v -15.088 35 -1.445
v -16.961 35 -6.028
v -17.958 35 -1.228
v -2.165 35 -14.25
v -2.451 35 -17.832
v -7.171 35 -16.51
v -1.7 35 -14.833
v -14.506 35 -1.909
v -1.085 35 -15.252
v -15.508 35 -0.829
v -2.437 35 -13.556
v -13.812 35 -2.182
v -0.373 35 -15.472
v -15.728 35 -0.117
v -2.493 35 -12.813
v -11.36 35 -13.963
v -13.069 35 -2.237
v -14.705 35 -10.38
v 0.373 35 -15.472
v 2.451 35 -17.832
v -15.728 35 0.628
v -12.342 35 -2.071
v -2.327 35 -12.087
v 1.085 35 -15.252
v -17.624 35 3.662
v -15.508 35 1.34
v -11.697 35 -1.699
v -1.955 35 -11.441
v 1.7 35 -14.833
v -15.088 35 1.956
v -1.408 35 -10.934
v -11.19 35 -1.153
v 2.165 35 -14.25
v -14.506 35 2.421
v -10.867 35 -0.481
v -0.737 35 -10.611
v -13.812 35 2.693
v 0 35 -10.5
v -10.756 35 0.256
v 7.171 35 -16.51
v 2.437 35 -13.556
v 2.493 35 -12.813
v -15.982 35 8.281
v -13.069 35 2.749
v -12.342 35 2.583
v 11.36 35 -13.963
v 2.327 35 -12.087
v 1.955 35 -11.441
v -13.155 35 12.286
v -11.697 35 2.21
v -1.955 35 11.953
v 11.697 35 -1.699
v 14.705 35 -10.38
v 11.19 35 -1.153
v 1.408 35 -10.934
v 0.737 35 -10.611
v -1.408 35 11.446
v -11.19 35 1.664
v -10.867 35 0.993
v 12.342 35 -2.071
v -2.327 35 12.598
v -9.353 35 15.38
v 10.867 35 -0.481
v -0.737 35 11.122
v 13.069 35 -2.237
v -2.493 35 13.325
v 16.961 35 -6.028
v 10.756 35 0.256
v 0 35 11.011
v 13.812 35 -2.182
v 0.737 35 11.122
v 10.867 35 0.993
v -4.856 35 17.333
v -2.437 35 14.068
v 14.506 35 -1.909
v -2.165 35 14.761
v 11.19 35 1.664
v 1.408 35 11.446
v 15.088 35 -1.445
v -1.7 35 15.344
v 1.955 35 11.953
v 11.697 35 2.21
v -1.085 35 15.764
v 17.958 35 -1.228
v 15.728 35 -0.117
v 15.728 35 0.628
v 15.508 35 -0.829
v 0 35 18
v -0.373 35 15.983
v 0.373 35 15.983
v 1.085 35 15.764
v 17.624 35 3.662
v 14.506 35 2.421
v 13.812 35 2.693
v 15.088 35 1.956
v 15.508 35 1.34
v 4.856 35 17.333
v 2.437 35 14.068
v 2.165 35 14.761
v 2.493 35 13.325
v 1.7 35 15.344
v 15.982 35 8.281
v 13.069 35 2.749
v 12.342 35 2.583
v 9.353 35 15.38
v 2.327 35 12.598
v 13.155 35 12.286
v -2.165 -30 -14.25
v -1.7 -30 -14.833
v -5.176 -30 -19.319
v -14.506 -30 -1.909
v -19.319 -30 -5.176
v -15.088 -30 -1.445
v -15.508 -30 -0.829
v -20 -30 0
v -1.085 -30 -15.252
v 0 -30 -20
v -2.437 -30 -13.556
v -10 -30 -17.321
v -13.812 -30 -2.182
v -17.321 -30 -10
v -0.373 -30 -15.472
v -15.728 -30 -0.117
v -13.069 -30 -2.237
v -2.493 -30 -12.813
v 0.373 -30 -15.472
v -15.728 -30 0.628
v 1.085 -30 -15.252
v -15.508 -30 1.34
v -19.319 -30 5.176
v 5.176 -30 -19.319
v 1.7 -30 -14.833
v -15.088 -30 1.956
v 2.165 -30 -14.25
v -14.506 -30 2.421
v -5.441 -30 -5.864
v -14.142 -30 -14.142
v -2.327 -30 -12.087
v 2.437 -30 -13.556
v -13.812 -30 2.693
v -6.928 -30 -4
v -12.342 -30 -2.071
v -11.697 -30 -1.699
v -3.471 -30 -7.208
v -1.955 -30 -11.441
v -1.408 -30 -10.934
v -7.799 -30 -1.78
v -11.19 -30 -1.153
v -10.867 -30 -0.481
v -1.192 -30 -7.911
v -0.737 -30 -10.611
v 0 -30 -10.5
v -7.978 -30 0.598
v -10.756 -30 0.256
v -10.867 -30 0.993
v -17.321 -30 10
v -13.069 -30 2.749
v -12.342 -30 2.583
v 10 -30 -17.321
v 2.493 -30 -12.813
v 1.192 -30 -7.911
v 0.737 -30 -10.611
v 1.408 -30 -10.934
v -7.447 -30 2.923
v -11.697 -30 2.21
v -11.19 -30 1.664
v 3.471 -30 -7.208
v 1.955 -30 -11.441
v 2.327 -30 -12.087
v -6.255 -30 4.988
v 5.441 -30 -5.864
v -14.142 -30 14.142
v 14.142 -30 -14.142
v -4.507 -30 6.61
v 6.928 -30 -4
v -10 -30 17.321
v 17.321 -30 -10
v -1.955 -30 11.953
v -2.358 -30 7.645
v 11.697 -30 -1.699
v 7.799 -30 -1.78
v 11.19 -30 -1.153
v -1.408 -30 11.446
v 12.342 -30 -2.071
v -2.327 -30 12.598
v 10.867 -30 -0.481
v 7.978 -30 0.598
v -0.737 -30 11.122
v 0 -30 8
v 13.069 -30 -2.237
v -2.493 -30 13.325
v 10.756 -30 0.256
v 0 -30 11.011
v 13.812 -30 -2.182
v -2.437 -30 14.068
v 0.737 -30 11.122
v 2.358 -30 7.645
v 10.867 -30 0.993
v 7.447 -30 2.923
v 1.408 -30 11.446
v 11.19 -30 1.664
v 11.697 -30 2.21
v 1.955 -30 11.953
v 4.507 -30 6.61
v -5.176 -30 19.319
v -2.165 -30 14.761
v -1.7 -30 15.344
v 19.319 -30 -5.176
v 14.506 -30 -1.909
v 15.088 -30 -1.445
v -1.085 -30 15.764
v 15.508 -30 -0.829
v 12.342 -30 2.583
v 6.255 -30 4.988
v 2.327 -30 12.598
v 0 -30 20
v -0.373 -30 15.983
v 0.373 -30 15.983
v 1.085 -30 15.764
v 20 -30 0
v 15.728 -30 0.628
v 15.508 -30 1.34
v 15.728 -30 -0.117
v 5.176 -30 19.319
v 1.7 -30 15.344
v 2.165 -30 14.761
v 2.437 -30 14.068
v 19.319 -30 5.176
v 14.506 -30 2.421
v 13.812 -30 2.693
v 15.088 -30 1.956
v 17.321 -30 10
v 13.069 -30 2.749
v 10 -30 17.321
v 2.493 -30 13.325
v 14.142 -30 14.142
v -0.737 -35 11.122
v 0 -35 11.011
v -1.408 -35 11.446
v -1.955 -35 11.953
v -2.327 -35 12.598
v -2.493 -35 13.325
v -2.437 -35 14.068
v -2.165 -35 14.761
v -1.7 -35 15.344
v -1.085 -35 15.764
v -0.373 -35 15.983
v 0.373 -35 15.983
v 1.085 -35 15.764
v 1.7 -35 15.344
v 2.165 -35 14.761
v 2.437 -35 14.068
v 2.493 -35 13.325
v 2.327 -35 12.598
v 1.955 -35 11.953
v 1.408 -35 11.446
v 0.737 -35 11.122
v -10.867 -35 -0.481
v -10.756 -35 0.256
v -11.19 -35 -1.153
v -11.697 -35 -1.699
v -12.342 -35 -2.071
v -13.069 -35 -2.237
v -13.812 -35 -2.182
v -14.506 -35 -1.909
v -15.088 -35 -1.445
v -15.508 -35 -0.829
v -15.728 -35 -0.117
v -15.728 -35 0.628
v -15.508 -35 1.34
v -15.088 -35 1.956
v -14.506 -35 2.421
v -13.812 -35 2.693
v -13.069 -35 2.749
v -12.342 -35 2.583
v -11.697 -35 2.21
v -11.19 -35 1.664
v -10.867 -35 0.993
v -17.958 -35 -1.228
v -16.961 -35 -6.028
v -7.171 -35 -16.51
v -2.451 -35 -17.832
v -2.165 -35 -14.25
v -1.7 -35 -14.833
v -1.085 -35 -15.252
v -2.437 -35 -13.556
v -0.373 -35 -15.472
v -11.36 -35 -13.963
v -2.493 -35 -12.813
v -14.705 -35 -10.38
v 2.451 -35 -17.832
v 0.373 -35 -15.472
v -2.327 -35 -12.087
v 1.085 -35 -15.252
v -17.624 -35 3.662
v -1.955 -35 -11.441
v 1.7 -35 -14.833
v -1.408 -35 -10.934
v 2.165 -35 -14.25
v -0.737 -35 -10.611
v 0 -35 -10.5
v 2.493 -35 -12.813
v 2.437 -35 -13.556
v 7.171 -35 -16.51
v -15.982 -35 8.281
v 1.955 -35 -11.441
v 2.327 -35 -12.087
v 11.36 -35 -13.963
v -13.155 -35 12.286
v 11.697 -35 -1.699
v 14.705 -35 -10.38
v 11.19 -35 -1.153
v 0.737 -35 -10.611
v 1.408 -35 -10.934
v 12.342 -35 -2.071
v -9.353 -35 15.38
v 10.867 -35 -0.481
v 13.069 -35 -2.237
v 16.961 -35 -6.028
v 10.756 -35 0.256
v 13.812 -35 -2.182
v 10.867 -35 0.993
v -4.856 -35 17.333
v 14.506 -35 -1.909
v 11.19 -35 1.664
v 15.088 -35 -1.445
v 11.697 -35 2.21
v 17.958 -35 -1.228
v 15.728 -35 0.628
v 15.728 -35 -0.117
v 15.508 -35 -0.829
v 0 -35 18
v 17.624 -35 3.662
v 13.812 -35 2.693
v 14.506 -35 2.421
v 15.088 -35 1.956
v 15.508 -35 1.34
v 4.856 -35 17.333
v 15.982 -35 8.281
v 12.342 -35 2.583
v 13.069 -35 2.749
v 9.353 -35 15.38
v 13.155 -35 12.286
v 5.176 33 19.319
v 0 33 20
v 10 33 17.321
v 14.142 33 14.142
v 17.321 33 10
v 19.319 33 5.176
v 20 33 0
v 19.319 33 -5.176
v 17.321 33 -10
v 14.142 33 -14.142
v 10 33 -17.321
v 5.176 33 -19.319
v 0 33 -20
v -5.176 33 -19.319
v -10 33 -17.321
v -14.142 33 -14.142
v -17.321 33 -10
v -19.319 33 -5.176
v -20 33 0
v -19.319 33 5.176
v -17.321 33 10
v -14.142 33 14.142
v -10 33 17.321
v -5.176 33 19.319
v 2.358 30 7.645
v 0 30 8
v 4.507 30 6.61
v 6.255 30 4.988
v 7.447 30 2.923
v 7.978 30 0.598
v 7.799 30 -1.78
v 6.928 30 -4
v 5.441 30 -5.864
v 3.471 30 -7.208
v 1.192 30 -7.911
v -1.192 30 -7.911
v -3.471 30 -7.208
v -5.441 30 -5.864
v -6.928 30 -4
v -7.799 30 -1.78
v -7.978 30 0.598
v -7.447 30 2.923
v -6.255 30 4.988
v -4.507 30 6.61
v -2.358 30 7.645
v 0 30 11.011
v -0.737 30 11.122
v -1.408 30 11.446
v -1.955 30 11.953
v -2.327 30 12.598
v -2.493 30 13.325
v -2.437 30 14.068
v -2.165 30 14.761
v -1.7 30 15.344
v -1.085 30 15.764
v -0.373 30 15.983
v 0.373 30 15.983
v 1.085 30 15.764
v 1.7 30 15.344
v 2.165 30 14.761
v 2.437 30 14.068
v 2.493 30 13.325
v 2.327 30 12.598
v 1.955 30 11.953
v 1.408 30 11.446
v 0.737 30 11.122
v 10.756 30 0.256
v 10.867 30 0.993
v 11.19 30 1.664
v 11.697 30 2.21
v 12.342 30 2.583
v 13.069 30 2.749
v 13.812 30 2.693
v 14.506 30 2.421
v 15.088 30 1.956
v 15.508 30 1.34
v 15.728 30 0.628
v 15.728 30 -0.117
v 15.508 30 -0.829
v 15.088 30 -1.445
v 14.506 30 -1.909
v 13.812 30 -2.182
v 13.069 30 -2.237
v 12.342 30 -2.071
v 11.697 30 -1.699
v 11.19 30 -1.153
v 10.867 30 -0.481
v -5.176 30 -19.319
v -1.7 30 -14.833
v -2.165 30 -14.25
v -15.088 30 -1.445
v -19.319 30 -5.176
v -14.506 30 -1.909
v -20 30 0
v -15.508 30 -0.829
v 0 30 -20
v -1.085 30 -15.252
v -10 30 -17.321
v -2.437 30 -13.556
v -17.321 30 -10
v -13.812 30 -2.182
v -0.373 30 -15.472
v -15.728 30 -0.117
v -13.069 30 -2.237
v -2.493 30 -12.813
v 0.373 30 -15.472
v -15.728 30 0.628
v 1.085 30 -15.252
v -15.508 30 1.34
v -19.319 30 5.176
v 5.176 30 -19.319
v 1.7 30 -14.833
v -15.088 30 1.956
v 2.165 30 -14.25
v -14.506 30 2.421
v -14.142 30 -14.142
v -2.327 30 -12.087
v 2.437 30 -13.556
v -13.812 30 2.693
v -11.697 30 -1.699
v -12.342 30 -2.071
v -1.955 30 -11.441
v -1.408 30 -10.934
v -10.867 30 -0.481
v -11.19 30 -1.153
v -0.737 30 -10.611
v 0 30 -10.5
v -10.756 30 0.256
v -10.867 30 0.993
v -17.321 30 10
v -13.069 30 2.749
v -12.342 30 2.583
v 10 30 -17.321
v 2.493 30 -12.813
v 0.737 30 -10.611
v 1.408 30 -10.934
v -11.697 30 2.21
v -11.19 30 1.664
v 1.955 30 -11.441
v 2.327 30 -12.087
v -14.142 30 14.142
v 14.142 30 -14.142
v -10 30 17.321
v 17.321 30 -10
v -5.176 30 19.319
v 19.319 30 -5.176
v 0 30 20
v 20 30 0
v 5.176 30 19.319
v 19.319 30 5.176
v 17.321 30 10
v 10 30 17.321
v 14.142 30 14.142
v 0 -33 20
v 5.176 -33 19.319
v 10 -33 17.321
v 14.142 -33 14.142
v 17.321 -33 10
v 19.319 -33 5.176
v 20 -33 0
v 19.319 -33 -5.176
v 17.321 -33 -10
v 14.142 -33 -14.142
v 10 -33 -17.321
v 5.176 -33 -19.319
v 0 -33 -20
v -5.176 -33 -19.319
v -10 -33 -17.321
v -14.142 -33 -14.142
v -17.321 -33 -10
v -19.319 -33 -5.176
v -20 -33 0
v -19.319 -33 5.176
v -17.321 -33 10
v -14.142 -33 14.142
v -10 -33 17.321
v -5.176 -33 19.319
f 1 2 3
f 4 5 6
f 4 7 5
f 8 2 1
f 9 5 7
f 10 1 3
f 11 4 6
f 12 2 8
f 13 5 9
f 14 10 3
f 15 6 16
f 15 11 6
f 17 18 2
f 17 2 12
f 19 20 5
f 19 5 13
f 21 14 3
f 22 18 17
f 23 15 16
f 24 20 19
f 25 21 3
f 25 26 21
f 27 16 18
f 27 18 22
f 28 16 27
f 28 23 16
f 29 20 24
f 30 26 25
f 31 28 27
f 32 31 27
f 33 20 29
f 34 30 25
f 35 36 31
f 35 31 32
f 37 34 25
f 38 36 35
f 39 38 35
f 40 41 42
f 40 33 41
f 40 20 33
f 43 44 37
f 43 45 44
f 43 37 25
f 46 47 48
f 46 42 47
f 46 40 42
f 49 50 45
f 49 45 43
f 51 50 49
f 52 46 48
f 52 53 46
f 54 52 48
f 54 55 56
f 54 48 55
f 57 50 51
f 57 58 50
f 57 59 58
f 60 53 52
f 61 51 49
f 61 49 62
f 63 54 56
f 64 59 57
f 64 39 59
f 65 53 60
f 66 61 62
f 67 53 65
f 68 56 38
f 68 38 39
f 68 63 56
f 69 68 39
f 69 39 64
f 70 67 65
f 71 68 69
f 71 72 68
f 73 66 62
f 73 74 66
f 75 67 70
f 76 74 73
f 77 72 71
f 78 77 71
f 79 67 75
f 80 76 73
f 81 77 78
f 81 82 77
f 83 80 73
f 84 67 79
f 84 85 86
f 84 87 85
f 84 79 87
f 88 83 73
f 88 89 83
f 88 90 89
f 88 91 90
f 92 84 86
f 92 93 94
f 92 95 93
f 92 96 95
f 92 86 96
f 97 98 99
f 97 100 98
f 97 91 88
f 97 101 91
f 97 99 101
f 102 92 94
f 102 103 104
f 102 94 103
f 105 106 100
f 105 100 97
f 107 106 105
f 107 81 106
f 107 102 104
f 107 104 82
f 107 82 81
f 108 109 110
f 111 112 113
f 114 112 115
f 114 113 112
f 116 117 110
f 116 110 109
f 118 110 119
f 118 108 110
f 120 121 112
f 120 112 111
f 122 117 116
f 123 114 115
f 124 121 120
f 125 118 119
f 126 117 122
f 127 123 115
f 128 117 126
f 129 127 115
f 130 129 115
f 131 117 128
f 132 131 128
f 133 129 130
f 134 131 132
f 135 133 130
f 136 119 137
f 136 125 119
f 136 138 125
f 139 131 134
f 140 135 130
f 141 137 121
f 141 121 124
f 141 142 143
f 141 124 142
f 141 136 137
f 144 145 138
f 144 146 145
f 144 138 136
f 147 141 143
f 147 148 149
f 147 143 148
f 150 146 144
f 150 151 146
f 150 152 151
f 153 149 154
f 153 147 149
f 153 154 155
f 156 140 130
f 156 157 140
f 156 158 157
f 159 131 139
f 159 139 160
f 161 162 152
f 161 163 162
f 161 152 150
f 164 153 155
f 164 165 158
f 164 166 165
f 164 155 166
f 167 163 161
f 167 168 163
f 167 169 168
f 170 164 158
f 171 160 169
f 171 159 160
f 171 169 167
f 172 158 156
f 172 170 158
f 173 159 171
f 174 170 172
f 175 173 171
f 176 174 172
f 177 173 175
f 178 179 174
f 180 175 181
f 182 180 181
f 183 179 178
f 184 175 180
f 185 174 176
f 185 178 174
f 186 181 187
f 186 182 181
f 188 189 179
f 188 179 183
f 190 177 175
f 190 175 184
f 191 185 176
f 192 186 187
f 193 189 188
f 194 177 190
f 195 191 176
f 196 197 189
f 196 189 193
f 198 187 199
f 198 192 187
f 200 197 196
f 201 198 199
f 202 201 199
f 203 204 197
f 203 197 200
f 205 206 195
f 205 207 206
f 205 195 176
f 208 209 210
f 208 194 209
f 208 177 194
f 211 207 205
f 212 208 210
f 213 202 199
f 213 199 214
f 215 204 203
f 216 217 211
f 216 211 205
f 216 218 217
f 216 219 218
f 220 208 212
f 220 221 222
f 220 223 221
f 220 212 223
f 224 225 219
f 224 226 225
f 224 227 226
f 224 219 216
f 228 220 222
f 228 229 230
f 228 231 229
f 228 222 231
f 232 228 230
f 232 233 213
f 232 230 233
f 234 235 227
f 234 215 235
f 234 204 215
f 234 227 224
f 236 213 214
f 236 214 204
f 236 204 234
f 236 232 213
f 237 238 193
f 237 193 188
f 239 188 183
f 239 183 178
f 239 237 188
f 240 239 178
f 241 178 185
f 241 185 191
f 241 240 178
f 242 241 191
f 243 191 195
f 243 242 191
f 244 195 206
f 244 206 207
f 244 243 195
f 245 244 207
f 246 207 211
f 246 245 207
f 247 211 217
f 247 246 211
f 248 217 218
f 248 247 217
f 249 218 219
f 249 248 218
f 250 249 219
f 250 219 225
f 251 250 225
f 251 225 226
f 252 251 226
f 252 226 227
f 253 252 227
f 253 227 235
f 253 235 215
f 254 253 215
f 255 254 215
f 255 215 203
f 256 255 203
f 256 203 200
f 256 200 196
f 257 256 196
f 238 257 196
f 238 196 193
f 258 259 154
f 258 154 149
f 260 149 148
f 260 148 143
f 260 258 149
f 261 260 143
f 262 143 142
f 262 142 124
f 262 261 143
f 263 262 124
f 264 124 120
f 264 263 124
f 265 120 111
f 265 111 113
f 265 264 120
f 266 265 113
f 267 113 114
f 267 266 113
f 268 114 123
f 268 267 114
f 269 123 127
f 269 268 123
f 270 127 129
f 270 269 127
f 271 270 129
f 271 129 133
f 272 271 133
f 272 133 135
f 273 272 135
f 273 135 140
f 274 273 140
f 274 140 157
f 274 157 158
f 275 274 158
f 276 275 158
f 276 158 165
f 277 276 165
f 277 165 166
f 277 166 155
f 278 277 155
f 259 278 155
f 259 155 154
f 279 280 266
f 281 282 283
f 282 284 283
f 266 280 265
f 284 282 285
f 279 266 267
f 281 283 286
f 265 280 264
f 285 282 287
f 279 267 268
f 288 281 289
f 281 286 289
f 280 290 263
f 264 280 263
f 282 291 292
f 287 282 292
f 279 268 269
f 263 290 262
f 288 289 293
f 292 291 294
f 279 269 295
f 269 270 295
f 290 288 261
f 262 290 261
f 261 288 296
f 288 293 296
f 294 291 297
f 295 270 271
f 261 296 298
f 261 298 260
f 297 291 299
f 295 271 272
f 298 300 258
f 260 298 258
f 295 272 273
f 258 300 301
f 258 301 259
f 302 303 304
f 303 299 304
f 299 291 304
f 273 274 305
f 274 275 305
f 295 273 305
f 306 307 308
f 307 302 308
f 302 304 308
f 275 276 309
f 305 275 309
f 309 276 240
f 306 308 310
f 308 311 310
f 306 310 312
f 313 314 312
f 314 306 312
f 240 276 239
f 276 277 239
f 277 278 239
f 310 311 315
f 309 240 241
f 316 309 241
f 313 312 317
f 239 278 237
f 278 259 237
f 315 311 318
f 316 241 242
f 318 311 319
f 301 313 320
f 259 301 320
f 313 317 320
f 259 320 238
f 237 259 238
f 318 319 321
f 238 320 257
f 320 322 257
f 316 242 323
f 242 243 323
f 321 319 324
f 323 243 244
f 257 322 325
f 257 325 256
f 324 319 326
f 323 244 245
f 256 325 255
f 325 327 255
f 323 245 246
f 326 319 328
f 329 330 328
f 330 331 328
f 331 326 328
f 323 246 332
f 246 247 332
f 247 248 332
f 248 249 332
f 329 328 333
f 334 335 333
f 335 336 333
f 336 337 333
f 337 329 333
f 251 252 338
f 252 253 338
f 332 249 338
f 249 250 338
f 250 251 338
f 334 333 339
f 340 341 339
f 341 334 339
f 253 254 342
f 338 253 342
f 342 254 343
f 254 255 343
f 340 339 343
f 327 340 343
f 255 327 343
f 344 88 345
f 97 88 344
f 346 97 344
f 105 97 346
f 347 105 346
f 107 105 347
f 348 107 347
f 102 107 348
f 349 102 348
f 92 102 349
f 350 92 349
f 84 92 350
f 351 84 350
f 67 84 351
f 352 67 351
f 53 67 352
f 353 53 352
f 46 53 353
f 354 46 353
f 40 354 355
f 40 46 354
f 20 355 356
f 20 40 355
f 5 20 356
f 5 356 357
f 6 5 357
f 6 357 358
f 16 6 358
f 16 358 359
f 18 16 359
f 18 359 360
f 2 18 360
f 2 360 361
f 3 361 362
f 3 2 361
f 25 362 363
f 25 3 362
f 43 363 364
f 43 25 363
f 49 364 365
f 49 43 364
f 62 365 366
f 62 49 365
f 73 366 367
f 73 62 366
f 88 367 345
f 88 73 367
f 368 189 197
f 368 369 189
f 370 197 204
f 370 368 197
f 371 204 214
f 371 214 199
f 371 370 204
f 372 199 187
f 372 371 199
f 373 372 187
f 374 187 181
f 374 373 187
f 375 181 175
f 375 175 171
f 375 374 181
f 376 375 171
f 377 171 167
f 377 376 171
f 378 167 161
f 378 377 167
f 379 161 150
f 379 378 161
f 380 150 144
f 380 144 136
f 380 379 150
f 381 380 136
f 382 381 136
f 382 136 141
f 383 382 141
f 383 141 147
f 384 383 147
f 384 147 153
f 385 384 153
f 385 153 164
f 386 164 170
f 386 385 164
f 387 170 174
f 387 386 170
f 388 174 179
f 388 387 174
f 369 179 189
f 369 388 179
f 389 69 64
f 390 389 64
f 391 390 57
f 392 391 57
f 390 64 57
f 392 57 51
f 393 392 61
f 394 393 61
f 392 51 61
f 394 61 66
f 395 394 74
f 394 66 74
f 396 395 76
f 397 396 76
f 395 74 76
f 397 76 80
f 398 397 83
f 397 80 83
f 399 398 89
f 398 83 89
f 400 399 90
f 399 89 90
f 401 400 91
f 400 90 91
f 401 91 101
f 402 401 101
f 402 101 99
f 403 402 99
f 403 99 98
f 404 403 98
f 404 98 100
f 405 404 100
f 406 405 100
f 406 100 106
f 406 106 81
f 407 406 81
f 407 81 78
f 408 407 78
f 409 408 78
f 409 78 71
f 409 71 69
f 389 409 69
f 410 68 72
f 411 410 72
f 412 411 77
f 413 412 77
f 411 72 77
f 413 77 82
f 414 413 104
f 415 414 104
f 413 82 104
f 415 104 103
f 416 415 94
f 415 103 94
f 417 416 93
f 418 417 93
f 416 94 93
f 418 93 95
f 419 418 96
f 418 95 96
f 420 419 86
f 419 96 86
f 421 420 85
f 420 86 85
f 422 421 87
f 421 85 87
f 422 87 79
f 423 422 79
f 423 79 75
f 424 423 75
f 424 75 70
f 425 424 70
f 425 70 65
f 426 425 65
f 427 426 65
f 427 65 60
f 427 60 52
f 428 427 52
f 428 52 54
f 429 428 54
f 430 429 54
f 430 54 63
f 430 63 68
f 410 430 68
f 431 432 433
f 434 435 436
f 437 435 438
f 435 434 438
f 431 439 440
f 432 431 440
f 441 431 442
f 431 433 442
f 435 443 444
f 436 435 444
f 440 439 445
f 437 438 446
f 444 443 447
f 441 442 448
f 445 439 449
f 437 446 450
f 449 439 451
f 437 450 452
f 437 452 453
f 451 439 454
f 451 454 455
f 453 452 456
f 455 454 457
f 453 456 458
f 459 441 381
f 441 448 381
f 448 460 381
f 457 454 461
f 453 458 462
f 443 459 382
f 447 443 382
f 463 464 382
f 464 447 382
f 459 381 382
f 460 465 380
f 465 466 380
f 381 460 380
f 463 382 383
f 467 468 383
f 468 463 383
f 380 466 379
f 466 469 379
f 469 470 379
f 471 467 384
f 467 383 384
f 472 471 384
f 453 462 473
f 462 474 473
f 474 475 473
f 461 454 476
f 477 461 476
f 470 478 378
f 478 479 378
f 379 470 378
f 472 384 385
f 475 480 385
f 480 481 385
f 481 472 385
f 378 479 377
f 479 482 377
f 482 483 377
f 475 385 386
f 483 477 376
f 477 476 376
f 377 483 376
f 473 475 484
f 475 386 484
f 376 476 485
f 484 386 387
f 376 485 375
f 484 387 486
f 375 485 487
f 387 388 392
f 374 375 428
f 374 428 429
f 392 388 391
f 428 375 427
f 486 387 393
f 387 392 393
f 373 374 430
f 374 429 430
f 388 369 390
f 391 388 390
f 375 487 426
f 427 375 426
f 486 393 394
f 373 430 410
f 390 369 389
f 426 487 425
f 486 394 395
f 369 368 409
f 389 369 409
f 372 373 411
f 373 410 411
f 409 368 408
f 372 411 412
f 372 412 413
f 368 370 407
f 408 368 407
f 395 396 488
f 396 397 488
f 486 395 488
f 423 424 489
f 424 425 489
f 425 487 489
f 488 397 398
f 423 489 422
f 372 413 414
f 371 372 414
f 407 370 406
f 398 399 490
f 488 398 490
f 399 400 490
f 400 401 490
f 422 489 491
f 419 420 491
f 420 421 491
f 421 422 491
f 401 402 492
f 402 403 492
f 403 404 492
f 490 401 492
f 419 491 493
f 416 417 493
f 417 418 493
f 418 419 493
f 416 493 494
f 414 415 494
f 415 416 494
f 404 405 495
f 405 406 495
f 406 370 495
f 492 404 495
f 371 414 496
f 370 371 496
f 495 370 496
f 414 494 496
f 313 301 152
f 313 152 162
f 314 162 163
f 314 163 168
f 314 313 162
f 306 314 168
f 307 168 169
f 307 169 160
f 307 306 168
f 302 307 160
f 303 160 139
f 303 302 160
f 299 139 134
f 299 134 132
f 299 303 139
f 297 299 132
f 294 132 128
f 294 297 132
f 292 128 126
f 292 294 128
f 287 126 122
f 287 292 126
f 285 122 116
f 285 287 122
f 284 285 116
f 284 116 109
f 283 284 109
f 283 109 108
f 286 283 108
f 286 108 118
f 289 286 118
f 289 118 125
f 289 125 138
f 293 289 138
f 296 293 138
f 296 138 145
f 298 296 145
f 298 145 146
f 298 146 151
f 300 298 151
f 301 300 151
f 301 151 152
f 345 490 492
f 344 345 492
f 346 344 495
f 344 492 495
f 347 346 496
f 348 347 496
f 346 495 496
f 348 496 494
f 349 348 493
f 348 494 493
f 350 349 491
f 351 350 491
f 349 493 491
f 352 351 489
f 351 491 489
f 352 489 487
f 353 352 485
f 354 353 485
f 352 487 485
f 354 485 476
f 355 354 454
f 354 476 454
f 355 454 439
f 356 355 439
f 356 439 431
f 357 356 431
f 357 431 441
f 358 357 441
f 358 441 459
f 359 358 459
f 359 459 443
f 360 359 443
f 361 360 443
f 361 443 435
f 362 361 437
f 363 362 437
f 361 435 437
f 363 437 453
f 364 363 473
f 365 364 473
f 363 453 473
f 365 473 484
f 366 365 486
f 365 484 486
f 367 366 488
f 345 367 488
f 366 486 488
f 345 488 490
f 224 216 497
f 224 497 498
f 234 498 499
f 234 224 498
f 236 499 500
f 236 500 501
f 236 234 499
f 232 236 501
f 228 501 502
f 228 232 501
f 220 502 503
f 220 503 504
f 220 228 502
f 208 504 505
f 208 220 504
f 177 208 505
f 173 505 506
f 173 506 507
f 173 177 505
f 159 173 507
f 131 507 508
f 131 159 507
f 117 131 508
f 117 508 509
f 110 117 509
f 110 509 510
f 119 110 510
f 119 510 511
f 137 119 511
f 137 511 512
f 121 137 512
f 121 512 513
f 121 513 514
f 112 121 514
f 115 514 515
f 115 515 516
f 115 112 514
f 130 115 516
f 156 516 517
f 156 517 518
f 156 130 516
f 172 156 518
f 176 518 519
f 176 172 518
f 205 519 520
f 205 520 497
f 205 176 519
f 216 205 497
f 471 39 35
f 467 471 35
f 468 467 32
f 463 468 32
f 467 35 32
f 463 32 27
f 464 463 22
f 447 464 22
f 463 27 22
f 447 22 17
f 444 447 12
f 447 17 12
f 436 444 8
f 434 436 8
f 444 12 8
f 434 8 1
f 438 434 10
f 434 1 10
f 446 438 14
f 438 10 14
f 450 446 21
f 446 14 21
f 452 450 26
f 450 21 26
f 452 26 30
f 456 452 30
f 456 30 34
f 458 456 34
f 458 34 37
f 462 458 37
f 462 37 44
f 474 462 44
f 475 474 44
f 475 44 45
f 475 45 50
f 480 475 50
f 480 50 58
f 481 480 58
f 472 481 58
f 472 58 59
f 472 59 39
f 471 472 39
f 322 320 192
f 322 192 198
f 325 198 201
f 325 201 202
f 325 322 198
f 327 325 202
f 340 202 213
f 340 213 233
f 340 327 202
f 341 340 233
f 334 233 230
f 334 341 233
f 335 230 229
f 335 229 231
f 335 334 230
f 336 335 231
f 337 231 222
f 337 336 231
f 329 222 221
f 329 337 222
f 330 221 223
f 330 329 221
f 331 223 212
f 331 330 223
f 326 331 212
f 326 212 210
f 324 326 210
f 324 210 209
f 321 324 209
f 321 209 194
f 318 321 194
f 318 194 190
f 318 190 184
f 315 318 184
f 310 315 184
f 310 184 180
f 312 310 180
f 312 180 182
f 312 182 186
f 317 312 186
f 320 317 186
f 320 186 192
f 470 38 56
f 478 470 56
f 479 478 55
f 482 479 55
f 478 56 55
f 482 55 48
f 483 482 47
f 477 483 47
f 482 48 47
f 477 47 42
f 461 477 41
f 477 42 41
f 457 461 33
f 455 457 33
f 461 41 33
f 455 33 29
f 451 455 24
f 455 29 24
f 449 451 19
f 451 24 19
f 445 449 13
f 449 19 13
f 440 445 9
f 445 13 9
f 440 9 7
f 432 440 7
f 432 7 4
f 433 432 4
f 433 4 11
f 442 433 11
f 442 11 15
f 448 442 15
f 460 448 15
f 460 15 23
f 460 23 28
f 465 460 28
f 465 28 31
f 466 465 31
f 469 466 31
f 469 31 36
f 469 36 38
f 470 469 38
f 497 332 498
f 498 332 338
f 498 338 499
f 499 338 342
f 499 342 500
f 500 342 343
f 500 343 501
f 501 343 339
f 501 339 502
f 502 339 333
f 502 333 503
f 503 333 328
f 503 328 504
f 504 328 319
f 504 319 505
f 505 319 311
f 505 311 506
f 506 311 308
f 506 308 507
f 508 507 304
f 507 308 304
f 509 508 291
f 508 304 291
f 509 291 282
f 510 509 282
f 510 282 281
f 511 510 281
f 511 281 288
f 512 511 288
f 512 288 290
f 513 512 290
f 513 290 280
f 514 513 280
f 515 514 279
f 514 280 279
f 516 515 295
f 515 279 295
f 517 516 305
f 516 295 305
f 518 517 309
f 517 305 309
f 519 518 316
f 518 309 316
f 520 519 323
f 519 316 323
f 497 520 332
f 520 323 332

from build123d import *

# Parameters (mm, degrees)
SKETCH1_R           = 8
BOSS_EXTRUDE1_DEPTH = 30
SKETCH2_R           = 20
BOSS_EXTRUDE2_DEPTH = 5
CHAMFER1_SIZE       = 2
SKETCH3_R           = 2.5
CUT_EXTRUDE1_DEPTH  = 71.887234394
CIRPATTERN1_COUNT   = 4


with BuildPart() as part:
    # Sketch1 → Boss-Extrude1 (new, symmetric)
    with BuildSketch(Plane(origin=(0, 0, 0), x_dir=(1, 0, 0), z_dir=(0, 1, 0))):
        with Locations(Location((0, 0, 0), (0, 0, 270))):
            Circle(SKETCH1_R)
    extrude(amount=BOSS_EXTRUDE1_DEPTH, both=True)

    # Sketch2 → Boss-Extrude2 (add)
    with BuildSketch(Plane(origin=(0, 30, 0), x_dir=(1, 0, 0), z_dir=(0, 1, 0))):
        with Locations(Location((0, 0, 0), (0, 0, 270))):
            Circle(SKETCH2_R)
    extrude(amount=BOSS_EXTRUDE2_DEPTH)

    # Chamfer1
    chamfer1_edges = [part.edges().sort_by_distance(p)[0] for p in [
        (0, 35, -20),
    ]]
    chamfer(chamfer1_edges, length=CHAMFER1_SIZE)

    # Sketch3 → Cut-Extrude1 (cut, through all)
    with BuildSketch(Plane(origin=(0, 35, 0), x_dir=(1, 0, 0), z_dir=(0, 1, 0))):
        with Locations(Location((0, 13, 0), (0, 0, 270))):
            Circle(SKETCH3_R)
    cut_extrude1 = extrude(amount=-CUT_EXTRUDE1_DEPTH, mode=Mode.SUBTRACT)

    # CirPattern1: Cut-Extrude1 ×4 about axis
    cirpattern1_axis = Axis((0, 0, 0.25570417), (0, 1, 0))
    for i in range(1, CIRPATTERN1_COUNT):
        add(cut_extrude1.rotate(cirpattern1_axis, i * 360 / CIRPATTERN1_COUNT), mode=Mode.SUBTRACT)

    # Mirror1: part across plane


with BuildPart() as part_1:
    add(part.part)
    add(part.part.mirror(Plane.ZX))


solid = part_1.part
